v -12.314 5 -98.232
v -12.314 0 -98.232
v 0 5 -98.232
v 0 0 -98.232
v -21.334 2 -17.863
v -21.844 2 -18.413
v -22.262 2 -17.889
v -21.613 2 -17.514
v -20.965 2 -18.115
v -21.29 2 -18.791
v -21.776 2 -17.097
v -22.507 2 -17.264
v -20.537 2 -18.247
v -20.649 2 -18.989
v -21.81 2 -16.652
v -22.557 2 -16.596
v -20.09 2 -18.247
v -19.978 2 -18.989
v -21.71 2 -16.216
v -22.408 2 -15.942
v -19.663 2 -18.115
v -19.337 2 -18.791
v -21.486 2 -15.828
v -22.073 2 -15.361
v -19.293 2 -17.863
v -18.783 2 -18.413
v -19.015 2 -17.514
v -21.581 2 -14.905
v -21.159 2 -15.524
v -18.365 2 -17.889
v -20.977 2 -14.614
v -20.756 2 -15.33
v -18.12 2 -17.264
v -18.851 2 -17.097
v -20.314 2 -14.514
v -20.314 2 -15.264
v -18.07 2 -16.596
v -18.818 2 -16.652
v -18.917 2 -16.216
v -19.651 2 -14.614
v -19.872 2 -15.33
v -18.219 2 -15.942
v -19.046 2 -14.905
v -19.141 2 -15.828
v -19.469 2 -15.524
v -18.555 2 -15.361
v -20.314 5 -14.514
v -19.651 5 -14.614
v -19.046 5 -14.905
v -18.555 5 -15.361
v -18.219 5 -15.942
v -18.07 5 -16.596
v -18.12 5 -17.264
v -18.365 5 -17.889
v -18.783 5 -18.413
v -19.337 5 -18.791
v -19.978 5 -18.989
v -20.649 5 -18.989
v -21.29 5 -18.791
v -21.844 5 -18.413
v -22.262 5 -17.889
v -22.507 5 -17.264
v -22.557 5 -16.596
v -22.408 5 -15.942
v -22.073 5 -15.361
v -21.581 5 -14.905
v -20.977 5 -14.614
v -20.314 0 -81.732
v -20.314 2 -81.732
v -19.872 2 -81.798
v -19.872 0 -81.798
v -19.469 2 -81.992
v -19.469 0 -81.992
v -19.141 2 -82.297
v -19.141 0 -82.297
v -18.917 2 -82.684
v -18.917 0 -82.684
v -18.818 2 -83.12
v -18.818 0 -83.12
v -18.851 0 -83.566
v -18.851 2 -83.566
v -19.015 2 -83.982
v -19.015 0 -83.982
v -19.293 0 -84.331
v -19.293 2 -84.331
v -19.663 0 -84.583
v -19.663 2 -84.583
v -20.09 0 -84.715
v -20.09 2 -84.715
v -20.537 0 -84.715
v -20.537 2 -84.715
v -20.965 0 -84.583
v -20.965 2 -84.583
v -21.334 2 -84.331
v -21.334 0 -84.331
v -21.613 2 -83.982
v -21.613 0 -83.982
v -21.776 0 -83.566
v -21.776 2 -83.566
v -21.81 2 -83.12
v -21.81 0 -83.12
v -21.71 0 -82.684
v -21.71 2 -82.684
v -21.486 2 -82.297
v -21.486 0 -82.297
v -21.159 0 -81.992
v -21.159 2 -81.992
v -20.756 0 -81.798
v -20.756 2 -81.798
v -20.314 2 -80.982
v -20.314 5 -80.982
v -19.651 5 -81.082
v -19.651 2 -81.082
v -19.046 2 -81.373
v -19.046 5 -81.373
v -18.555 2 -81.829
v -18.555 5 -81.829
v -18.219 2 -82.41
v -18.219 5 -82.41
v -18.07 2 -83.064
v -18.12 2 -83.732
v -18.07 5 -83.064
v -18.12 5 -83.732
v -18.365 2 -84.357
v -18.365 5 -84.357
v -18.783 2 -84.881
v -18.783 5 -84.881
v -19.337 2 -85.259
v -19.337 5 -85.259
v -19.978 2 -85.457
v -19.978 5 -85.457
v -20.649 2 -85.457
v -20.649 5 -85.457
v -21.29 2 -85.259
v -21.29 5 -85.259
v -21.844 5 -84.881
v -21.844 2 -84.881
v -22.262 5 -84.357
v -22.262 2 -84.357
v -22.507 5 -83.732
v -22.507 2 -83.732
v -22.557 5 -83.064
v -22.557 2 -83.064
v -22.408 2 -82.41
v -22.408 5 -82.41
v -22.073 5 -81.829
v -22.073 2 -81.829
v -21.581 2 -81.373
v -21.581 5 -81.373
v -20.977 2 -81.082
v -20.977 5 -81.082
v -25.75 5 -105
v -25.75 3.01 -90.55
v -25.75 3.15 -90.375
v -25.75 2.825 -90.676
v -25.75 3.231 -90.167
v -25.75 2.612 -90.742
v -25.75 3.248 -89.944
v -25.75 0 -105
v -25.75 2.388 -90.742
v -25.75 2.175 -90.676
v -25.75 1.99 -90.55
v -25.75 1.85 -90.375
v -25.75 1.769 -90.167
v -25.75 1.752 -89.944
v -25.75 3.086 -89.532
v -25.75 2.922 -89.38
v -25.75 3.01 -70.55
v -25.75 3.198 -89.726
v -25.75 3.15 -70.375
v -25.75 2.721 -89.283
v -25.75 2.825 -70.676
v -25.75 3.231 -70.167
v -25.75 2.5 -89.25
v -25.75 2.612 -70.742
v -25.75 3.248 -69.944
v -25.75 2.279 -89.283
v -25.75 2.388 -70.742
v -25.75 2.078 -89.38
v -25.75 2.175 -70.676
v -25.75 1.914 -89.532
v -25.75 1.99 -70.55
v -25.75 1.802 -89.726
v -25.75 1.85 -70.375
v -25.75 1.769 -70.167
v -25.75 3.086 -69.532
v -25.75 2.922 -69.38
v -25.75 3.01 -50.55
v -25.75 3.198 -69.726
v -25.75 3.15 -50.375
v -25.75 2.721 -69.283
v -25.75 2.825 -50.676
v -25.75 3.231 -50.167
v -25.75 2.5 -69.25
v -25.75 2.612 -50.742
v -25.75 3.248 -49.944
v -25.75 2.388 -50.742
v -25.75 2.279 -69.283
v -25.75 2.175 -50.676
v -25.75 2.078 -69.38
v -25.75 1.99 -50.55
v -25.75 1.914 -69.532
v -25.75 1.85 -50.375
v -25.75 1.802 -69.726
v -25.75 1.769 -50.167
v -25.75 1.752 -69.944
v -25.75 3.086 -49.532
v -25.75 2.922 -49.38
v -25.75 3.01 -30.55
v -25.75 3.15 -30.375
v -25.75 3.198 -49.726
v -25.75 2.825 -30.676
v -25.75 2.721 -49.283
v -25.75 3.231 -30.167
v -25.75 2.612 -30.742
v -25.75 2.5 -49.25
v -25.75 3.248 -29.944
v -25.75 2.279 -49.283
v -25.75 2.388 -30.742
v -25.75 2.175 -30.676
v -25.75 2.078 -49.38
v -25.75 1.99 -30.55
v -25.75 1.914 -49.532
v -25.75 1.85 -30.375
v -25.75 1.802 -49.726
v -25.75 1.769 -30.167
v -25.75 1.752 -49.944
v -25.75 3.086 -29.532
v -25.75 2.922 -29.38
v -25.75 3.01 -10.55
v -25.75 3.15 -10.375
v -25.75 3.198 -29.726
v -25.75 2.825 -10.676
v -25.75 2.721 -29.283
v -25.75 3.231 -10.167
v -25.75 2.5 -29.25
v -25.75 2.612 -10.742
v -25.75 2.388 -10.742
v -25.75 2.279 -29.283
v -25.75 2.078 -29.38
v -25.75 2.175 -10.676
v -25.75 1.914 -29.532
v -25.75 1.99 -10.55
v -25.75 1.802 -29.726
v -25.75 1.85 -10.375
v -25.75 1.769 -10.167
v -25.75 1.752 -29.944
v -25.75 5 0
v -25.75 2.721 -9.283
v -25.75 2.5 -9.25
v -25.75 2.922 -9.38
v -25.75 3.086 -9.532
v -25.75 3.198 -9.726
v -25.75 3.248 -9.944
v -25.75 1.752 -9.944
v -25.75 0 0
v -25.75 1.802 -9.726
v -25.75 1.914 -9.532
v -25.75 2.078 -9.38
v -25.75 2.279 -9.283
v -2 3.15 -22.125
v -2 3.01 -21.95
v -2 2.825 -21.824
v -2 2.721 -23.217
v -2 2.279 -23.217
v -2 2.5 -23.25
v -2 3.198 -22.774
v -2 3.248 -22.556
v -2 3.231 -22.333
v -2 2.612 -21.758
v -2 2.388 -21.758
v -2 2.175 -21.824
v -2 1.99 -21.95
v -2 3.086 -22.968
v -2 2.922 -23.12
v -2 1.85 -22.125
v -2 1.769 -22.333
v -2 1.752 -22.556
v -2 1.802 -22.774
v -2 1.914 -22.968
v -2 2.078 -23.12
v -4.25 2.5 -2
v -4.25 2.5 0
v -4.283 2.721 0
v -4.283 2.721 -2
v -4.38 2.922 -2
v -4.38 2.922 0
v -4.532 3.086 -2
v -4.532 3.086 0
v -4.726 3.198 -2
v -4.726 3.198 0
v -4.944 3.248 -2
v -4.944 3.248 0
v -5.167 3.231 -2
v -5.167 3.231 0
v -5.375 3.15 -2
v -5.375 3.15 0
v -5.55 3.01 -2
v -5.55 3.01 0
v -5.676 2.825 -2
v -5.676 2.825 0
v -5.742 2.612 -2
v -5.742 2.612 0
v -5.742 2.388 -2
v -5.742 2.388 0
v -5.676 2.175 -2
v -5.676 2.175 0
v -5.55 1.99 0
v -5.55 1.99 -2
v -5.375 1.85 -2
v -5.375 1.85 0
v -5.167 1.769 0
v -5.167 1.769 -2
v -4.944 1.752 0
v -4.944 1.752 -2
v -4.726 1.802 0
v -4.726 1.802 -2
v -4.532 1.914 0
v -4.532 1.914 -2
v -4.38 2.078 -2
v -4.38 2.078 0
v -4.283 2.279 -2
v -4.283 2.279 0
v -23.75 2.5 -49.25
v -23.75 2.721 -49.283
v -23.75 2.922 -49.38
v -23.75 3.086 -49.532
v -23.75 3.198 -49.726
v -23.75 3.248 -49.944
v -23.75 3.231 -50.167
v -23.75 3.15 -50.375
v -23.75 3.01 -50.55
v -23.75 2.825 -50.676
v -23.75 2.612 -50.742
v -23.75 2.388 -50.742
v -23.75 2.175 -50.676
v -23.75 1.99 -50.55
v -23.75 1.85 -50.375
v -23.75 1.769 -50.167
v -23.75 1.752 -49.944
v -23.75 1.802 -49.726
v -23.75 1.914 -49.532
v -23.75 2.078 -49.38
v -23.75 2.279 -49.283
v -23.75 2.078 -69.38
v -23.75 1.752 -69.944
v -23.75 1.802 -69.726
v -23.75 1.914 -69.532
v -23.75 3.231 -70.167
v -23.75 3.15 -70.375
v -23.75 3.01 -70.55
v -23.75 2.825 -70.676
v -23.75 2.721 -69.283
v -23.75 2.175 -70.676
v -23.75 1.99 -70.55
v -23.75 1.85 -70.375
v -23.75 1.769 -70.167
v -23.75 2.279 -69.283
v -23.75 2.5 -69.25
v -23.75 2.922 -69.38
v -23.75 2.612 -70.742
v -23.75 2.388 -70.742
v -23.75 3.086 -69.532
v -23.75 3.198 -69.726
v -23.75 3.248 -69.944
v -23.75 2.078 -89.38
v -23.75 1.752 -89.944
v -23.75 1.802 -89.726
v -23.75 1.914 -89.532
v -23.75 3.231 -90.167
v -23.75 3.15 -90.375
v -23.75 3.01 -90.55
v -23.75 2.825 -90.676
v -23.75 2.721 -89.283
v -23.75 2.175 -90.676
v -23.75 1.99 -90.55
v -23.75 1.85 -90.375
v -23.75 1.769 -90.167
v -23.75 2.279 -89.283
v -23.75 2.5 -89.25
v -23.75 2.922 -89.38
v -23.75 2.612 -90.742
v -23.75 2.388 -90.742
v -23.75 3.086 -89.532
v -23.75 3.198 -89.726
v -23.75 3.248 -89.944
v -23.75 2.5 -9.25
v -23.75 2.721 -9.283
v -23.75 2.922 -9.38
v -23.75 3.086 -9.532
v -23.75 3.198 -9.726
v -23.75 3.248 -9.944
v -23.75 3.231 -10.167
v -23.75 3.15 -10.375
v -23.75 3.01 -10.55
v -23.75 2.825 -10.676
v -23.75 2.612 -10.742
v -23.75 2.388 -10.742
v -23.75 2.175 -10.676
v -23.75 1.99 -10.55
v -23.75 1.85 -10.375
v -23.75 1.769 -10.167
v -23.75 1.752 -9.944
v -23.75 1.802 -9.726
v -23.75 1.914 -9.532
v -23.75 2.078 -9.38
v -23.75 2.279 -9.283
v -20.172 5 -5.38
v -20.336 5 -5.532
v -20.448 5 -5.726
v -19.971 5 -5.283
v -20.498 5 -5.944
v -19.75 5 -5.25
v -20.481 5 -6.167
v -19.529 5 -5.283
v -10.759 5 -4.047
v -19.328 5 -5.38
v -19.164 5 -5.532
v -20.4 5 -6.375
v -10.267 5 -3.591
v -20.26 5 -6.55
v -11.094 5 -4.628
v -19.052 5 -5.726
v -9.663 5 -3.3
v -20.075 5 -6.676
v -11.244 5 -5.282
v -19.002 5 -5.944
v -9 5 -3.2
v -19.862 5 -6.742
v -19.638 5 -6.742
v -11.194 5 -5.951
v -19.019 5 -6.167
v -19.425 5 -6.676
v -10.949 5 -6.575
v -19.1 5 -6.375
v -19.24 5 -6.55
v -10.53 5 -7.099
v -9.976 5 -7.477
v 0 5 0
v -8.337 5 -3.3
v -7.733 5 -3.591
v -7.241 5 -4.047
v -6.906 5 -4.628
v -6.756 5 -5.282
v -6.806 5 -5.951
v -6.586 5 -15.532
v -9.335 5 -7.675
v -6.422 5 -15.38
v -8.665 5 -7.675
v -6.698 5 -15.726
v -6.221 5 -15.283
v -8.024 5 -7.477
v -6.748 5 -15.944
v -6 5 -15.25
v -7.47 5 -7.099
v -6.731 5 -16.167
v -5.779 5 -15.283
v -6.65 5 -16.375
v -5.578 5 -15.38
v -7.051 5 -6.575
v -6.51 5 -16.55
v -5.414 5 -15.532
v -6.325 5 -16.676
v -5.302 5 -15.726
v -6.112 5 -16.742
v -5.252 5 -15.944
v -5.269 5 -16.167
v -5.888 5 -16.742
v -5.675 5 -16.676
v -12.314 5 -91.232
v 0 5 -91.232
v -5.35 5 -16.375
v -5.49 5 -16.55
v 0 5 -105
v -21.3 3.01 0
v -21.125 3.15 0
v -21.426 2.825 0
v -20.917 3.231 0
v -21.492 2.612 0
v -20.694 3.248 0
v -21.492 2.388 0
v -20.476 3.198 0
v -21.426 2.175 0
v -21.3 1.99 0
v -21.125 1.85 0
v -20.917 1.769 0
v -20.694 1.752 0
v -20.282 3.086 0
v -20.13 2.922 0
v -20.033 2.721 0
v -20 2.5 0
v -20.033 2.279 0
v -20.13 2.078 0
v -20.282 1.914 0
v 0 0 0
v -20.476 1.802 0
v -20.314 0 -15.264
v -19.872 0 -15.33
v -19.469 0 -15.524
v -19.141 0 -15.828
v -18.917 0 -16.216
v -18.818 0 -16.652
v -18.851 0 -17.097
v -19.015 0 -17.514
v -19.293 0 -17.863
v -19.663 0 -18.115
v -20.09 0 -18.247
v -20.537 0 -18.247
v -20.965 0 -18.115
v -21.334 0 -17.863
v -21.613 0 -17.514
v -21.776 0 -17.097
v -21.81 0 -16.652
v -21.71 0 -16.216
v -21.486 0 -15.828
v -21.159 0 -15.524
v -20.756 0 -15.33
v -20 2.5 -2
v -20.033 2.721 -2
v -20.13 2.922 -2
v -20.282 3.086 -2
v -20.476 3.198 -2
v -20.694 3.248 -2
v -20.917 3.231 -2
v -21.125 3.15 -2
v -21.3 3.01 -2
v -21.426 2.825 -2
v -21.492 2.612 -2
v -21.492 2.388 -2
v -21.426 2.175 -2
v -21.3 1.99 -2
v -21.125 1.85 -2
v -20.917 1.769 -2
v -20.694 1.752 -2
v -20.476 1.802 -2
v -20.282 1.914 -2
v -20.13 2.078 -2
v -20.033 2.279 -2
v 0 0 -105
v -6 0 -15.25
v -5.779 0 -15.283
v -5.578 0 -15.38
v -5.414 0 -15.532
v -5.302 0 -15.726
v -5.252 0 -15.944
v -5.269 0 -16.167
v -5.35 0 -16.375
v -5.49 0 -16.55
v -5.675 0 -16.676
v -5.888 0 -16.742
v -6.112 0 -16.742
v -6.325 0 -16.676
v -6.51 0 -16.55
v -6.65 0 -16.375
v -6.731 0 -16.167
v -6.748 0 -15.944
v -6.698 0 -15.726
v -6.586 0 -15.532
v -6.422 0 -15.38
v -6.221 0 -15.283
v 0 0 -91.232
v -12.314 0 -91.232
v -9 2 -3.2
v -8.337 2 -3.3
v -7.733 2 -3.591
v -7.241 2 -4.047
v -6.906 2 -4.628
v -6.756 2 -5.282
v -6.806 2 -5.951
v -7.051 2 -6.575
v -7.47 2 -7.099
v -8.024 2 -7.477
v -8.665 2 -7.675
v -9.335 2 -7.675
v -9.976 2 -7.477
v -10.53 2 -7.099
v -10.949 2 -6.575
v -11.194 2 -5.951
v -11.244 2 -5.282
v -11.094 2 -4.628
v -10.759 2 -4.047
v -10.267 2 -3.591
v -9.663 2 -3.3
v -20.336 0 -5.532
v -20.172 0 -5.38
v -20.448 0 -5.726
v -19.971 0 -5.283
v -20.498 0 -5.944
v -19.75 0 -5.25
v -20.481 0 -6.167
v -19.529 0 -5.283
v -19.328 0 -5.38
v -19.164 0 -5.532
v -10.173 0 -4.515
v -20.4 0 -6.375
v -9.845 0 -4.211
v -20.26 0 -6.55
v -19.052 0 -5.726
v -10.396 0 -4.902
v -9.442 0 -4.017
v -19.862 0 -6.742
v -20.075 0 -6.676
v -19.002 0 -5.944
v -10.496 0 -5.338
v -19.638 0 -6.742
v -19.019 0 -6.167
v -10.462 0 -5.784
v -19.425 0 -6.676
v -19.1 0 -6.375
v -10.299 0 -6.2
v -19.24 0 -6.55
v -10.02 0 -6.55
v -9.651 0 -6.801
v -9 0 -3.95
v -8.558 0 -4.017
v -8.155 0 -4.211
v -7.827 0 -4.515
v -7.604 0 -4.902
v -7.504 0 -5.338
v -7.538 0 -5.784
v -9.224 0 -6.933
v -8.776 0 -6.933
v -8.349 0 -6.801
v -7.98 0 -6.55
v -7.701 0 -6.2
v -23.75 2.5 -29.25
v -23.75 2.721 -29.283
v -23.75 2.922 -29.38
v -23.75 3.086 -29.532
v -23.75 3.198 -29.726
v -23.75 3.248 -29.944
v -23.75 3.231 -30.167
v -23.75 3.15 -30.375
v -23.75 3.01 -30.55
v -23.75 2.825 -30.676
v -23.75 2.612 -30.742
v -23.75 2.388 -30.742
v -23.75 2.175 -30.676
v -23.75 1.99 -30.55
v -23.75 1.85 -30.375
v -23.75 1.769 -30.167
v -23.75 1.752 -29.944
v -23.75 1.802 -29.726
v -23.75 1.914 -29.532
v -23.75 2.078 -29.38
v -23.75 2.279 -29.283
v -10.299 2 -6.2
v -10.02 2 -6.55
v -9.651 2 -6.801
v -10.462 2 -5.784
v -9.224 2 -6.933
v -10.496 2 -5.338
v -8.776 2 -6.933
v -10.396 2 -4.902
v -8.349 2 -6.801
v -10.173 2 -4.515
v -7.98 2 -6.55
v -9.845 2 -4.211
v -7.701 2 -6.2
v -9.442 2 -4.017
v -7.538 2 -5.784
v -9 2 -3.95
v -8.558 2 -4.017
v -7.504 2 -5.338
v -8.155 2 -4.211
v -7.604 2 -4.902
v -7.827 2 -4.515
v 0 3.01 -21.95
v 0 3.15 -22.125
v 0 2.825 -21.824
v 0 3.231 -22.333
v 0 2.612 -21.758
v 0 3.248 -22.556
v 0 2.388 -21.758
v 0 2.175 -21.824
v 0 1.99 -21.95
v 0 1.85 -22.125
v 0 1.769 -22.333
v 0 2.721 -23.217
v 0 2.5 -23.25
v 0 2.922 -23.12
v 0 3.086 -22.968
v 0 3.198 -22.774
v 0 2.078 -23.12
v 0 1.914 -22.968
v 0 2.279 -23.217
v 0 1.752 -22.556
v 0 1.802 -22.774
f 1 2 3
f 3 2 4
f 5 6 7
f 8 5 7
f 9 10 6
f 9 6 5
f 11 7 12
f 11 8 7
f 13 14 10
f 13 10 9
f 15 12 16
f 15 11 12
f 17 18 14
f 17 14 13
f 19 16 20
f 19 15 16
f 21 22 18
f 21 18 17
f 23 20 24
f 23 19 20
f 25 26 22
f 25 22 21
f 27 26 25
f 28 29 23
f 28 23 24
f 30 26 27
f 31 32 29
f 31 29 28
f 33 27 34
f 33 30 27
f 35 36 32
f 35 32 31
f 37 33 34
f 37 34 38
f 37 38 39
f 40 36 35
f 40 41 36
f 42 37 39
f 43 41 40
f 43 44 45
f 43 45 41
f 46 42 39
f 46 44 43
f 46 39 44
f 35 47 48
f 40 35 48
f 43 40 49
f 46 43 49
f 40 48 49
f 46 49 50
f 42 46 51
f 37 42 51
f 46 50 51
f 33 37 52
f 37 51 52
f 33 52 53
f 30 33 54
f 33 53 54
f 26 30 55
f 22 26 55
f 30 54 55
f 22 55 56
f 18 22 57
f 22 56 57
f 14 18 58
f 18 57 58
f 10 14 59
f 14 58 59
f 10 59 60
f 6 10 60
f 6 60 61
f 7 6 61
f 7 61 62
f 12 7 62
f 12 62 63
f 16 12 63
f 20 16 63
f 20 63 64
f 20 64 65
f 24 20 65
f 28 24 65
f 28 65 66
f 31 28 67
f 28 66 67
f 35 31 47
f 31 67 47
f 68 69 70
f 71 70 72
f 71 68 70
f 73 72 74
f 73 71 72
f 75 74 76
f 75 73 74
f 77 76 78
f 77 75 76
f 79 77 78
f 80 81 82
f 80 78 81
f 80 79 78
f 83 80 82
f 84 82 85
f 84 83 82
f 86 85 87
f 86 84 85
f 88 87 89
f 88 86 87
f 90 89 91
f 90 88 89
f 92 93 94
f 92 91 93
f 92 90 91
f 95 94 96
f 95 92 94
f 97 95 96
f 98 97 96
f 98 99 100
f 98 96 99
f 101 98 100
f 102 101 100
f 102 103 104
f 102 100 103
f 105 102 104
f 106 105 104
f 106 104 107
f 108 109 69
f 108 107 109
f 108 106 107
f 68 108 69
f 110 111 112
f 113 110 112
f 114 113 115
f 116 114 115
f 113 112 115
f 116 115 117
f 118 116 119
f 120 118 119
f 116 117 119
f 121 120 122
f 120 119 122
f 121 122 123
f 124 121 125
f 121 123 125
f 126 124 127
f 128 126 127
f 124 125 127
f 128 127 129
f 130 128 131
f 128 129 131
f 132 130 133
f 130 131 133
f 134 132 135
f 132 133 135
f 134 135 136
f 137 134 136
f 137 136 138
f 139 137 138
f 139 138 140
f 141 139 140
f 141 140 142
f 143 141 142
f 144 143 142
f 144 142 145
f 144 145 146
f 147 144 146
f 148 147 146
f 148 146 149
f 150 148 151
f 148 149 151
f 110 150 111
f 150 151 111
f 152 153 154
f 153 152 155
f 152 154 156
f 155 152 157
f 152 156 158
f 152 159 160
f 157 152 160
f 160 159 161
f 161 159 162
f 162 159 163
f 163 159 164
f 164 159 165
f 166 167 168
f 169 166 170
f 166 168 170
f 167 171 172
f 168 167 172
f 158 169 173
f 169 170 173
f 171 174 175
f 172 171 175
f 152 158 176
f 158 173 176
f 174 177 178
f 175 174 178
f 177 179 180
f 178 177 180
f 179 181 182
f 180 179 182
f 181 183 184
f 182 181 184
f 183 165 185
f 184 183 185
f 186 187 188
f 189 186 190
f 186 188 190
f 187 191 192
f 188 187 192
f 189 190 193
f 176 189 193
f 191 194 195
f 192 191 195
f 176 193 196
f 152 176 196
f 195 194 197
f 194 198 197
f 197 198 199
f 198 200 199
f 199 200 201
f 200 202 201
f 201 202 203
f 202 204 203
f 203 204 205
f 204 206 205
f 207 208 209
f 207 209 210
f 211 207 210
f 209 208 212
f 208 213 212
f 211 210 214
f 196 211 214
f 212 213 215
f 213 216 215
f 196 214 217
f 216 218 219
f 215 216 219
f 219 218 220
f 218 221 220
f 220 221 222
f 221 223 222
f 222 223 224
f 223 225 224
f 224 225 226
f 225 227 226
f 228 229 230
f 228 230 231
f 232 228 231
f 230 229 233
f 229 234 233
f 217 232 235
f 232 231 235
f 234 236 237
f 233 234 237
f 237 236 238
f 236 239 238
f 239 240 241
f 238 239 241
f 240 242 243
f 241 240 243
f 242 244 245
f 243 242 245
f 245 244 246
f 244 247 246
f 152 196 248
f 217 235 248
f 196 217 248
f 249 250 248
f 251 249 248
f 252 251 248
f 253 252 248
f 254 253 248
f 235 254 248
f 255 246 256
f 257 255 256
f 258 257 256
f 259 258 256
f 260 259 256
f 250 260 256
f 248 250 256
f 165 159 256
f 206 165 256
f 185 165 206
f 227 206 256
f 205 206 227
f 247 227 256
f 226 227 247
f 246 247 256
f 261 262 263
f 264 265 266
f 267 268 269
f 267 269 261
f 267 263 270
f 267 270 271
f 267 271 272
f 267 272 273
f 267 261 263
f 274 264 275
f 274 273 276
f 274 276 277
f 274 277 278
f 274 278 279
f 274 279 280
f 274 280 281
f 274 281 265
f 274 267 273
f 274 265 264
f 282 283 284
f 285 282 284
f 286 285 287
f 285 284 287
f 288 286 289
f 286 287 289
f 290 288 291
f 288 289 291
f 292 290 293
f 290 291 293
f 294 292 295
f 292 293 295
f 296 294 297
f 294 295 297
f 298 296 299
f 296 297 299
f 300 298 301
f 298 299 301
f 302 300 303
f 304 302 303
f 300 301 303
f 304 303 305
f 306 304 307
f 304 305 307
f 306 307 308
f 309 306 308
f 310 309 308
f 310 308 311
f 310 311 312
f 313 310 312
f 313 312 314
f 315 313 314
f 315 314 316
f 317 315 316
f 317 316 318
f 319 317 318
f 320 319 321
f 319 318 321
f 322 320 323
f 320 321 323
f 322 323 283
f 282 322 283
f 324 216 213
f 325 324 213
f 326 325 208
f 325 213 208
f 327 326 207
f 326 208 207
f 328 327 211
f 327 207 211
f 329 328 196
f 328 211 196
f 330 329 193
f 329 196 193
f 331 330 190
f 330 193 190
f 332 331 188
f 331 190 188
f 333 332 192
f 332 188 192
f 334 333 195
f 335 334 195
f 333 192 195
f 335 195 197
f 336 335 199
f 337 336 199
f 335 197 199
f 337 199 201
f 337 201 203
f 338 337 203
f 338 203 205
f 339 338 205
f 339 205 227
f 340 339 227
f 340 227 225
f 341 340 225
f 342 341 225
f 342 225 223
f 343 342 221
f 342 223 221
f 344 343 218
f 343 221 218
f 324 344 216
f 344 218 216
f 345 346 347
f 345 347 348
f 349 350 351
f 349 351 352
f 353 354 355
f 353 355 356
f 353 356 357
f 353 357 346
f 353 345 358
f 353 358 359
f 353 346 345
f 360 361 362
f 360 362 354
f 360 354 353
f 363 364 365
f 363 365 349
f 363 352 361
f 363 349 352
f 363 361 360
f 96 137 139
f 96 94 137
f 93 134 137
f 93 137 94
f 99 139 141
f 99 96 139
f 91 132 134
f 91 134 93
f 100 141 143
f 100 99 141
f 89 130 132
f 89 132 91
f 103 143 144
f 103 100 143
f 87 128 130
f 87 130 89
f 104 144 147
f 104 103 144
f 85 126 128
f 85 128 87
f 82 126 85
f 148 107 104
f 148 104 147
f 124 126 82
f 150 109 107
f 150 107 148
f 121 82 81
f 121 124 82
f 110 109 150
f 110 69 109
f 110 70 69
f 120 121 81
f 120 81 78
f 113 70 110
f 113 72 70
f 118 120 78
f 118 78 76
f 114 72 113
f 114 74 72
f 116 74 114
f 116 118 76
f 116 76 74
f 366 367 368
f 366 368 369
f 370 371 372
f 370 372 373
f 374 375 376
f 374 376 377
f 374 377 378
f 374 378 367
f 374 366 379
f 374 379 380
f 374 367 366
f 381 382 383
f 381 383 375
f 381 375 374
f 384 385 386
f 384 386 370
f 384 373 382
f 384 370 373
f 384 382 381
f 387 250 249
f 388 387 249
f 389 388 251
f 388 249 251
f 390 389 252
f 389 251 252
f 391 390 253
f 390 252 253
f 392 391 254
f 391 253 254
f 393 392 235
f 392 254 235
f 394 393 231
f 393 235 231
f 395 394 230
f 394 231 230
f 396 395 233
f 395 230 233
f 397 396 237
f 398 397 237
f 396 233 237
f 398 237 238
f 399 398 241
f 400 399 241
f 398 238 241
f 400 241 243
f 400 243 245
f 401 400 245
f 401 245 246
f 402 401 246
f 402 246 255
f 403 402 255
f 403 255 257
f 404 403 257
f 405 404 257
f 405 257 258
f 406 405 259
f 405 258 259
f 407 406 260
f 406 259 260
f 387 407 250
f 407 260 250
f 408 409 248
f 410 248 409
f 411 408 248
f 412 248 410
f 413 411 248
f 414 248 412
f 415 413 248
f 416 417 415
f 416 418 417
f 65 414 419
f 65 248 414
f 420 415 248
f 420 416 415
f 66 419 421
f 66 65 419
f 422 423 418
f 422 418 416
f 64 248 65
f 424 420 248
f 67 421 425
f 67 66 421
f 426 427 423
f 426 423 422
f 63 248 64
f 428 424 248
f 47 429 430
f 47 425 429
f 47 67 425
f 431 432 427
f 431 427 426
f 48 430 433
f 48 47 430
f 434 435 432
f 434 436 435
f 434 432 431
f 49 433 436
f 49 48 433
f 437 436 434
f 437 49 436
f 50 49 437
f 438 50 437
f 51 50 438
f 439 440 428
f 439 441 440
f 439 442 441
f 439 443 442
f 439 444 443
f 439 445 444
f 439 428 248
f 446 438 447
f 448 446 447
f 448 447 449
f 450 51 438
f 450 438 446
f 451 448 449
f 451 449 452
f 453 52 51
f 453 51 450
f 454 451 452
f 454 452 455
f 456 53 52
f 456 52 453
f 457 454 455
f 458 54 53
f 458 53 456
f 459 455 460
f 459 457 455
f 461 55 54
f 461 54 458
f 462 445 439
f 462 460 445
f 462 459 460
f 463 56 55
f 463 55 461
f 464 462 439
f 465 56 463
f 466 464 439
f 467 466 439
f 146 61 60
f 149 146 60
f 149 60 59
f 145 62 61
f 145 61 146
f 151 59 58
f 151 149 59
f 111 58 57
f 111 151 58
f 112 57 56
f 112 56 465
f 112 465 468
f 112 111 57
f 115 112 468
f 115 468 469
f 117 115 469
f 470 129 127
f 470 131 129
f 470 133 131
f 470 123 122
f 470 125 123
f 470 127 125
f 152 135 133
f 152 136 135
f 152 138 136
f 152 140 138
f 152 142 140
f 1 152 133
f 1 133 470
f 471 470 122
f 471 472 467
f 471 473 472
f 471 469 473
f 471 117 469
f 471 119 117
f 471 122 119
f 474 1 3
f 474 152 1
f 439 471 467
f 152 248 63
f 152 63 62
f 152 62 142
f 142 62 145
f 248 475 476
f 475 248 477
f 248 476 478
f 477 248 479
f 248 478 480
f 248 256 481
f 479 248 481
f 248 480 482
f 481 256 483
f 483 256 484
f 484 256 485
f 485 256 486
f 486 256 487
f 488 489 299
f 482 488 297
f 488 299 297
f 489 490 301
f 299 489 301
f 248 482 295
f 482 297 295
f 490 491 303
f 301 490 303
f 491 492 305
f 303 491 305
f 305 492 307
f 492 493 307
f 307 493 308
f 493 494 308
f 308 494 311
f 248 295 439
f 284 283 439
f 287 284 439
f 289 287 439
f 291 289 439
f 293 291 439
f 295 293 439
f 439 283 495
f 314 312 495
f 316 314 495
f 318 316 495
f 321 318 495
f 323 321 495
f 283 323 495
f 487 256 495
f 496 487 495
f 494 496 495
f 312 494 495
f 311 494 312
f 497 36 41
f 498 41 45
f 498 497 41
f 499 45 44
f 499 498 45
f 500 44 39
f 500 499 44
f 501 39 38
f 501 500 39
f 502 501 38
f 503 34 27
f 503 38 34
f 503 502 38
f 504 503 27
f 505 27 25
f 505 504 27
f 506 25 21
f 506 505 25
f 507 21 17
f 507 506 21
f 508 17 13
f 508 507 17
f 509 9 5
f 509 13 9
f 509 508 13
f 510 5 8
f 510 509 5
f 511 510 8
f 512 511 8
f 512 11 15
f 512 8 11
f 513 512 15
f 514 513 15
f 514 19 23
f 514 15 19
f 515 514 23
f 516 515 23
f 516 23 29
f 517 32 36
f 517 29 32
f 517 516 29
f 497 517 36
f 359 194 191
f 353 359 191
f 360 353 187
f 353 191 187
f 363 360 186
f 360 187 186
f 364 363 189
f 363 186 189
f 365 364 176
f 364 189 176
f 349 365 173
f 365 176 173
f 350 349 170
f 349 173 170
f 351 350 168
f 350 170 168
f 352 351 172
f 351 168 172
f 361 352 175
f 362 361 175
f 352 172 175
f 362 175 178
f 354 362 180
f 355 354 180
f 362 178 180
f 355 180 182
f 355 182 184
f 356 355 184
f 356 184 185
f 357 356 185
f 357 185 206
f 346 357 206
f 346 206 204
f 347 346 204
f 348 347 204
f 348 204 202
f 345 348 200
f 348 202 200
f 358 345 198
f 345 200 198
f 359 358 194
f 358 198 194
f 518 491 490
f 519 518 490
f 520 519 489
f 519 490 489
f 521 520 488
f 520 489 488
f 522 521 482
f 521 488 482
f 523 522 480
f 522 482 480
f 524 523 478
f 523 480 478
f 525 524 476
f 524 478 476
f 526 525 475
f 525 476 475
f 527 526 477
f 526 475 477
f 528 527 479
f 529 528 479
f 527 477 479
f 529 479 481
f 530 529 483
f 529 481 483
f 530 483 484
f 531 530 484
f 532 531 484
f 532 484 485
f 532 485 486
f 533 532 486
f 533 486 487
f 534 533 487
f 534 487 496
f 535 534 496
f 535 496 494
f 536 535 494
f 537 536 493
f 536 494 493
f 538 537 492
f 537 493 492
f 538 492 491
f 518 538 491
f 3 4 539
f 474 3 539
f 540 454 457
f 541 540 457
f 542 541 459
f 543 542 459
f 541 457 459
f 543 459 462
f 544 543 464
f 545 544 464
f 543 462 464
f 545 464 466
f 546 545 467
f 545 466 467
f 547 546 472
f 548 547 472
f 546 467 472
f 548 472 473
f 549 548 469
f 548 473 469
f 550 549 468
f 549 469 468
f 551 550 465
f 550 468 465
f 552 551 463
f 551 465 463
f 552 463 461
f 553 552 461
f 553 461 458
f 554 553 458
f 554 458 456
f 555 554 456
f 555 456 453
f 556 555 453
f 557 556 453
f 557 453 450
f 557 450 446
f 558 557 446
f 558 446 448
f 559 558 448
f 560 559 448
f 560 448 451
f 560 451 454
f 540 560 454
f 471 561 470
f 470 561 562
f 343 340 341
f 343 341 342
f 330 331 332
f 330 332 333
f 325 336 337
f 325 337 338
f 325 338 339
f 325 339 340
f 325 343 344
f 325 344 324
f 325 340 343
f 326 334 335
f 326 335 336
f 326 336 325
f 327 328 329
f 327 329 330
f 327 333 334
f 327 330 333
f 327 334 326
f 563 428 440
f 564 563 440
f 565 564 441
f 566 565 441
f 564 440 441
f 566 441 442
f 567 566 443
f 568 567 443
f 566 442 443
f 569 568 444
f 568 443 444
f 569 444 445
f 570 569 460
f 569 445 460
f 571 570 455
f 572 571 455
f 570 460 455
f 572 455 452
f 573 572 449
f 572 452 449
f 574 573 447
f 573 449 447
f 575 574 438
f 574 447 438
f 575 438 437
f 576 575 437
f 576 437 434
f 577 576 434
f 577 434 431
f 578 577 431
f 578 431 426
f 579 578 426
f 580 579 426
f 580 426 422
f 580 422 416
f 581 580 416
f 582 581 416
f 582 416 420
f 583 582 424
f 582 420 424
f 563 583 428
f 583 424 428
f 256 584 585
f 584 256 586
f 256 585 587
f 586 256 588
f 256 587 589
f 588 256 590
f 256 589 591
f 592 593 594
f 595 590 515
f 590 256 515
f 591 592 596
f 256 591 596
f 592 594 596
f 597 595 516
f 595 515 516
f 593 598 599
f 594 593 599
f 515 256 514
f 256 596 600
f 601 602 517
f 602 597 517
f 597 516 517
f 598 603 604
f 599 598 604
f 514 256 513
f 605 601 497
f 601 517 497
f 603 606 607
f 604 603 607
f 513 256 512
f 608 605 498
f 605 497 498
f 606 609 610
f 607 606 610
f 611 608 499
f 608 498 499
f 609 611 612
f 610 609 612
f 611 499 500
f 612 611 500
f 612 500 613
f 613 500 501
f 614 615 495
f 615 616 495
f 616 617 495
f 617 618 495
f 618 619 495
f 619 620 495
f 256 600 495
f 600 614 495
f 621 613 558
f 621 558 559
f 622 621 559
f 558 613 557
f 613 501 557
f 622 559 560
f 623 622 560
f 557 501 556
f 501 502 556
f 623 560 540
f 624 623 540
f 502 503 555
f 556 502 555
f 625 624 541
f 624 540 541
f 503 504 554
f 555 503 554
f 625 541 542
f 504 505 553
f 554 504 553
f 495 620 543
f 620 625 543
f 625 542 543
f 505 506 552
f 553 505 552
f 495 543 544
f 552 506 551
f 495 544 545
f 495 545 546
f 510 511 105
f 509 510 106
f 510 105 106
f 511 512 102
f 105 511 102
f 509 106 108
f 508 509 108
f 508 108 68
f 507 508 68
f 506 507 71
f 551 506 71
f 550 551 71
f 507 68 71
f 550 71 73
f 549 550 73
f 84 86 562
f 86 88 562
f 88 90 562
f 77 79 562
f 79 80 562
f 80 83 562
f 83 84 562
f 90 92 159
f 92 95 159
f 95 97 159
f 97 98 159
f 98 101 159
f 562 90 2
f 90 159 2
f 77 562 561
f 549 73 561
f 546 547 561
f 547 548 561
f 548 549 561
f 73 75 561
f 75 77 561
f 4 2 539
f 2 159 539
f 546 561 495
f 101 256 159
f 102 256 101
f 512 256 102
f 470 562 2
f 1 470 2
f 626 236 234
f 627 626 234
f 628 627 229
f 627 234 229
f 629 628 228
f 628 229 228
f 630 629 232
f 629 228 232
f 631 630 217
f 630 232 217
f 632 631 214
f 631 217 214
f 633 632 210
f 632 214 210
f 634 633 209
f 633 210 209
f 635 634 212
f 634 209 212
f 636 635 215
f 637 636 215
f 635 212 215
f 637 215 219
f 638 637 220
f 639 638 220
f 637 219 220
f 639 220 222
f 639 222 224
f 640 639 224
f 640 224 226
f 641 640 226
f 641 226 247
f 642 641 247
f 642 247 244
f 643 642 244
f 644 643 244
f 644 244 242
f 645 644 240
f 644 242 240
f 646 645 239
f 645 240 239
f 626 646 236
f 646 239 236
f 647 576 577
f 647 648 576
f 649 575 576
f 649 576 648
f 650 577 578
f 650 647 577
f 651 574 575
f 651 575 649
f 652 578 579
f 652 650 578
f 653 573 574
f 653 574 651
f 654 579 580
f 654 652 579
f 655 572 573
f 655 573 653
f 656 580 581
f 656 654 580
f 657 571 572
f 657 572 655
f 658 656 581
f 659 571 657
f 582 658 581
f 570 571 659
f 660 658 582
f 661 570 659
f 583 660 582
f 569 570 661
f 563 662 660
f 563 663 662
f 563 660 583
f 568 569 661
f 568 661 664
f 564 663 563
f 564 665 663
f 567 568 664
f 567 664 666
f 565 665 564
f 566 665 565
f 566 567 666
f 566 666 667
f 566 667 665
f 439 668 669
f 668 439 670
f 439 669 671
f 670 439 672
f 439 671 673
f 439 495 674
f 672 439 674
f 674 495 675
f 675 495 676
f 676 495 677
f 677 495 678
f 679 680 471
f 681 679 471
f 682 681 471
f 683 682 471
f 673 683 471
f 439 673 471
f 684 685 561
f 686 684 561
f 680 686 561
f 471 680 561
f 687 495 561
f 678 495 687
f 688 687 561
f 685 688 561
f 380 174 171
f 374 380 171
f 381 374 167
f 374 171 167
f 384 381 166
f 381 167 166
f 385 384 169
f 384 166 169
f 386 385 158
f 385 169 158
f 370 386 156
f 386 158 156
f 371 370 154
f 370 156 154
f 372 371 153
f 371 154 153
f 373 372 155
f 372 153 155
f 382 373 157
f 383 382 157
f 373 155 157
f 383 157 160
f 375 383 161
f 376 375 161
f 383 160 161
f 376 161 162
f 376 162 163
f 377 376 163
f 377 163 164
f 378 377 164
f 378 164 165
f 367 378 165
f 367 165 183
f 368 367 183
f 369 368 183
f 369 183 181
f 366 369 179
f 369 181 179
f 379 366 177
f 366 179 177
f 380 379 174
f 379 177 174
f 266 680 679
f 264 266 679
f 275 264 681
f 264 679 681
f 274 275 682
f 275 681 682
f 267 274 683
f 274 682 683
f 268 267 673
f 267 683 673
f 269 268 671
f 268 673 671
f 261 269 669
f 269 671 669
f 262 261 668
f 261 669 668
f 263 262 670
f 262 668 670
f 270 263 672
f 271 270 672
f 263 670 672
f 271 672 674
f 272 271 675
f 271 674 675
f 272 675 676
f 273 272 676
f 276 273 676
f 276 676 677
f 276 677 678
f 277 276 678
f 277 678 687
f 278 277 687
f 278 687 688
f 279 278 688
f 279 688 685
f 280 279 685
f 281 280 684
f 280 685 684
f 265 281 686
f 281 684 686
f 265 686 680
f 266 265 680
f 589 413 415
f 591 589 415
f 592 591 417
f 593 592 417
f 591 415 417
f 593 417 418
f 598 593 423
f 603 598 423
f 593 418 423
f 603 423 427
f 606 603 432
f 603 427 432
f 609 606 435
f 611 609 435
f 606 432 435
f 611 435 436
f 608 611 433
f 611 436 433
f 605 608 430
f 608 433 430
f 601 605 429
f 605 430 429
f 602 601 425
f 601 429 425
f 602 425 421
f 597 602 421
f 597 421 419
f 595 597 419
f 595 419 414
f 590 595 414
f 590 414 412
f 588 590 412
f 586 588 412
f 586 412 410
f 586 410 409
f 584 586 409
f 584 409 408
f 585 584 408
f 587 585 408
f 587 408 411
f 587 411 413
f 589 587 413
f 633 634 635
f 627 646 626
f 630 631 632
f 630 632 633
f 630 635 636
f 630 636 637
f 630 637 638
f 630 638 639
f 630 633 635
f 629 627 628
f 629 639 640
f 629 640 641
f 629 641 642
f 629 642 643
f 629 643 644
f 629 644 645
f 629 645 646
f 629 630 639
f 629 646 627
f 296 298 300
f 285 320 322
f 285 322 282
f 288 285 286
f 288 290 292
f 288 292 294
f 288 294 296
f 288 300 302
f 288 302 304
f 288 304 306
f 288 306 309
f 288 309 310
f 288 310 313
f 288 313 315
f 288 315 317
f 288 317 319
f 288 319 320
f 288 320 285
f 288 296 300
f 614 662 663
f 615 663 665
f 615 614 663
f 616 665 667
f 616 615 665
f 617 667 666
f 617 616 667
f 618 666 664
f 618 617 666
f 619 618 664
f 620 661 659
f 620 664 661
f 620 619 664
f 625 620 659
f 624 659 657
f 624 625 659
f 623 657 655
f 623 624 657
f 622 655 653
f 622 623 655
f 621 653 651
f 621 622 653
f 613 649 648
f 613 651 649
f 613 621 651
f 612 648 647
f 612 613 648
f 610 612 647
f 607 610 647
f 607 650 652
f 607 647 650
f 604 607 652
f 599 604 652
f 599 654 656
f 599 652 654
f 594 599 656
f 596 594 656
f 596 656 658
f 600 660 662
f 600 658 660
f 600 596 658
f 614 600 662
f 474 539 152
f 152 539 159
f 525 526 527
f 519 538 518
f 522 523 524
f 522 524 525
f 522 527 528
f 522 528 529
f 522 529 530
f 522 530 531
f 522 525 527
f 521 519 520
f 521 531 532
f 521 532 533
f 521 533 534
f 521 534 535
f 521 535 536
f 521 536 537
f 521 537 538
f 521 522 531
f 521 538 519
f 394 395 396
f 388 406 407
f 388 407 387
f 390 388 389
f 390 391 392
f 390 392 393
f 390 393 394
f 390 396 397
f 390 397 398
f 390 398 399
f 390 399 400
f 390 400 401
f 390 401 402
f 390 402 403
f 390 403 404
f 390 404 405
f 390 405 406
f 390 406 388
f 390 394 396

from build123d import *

# Parameters (mm, degrees)
EXTRUDE_1_DEPTH     = 5
SKETCH_1_12_R       = 1.5
CUT_EXTRUDE_1_DEPTH = 109.226902848
CUT_EXTRUDE_START   = 5
SKETCH_1_13_R       = 2.25
CUT_EXTRUDE_3_DEPTH = 3
SKETCH_2_R          = 0.75
CUT_EXTRUDE_4_DEPTH = 2
SKETCH_3_R          = 0.75
CUT_EXTRUDE_5_DEPTH = 2
SKETCH_4_R          = 0.75
CUT_EXTRUDE_6_DEPTH = 109.226902848
SKETCH_5_R          = 0.75
CUT_EXTRUDE_7_DEPTH = 2


with BuildPart() as part:
    # 草图1 → 凸台-拉伸1 (new body)
    with BuildSketch(Plane(origin=(0, 0, 0), x_dir=(1, 0, 0), z_dir=(0, 1, 0))):
        Polygon((-25.75, 0), (0, 0), (0, 91.231745931), (-12.313708499, 91.231745931), (-12.313708499, 98.231745931), (0, 98.231745931), (0, 105), (-25.75, 105), align=None)
    extrude(amount=EXTRUDE_1_DEPTH)

    # 草图1<12> → 切除-拉伸1 (cut, through all)
    with BuildSketch(Plane(origin=(0, 0, 0), x_dir=(1, 0, 0), z_dir=(0, 1, 0))):
        with Locations(Location((-20.313708499, 83.231745931, 0), (0, 0, 270))):
            Circle(SKETCH_1_12_R)
        with Locations(Location((-20.313708499, 16.763708499, 0), (0, 0, 270))):
            Circle(SKETCH_1_12_R)
        with Locations(Location((-9, 5.45, 0), (0, 0, 270))):
            Circle(SKETCH_1_12_R)
    extrude(amount=CUT_EXTRUDE_1_DEPTH, mode=Mode.SUBTRACT)

    # 草图1<13> → 切除-拉伸3 (cut)
    with BuildSketch(Plane(origin=(0, 0, 0), x_dir=(1, 0, 0), z_dir=(0, 1, 0)).offset(CUT_EXTRUDE_START)):
        with Locations(Location((-20.313708499, 83.231745931, 0), (0, 0, 270))):
            Circle(SKETCH_1_13_R)
        with Locations(Location((-9, 5.45, 0), (0, 0, 270))):
            Circle(SKETCH_1_13_R)
        with Locations(Location((-20.313708499, 16.763708499, 0), (0, 0, 270))):
            Circle(SKETCH_1_13_R)
    extrude(amount=-CUT_EXTRUDE_3_DEPTH, mode=Mode.SUBTRACT)

    # 草图2 → 切除-拉伸4 (cut)
    with BuildSketch(Plane.XY):
        with Locations((-20.75, 2.5)):
            Circle(SKETCH_2_R)
        with Locations((-5, 2.5)):
            Circle(SKETCH_2_R)
    extrude(amount=-CUT_EXTRUDE_4_DEPTH, mode=Mode.SUBTRACT)

    # 草图3 → 切除-拉伸5 (cut)
    with BuildSketch(Plane(origin=(0, 0, 0), x_dir=(0, 0, -1), z_dir=(1, 0, 0))):
        with Locations((22.5, 2.5)):
            Circle(SKETCH_3_R)
    extrude(amount=-CUT_EXTRUDE_5_DEPTH, mode=Mode.SUBTRACT)

    # 草图4 → 切除-拉伸6 (cut, through all)
    with BuildSketch(Plane(origin=(0, 5, 0), x_dir=(1, 0, 0), z_dir=(0, 1, 0))):
        with Locations(Location((-6, 16, 0), (0, 0, 270))):
            Circle(SKETCH_4_R)
        with Locations(Location((-19.75, 6, 0), (0, 0, 270))):
            Circle(SKETCH_4_R)
    extrude(amount=-CUT_EXTRUDE_6_DEPTH, mode=Mode.SUBTRACT)

    # 草图5 → 切除-拉伸7 (cut)
    with BuildSketch(Plane.ZY.offset(25.75)):
        with Locations((-10, 2.5)):
            Circle(SKETCH_5_R)
        with Locations((-50, 2.5)):
            Circle(SKETCH_5_R)
        with Locations((-70, 2.5)):
            Circle(SKETCH_5_R)
        with Locations((-90, 2.5)):
            Circle(SKETCH_5_R)
        with Locations((-30, 2.5)):
            Circle(SKETCH_5_R)
    extrude(amount=-CUT_EXTRUDE_7_DEPTH, mode=Mode.SUBTRACT)


solid = part.part
